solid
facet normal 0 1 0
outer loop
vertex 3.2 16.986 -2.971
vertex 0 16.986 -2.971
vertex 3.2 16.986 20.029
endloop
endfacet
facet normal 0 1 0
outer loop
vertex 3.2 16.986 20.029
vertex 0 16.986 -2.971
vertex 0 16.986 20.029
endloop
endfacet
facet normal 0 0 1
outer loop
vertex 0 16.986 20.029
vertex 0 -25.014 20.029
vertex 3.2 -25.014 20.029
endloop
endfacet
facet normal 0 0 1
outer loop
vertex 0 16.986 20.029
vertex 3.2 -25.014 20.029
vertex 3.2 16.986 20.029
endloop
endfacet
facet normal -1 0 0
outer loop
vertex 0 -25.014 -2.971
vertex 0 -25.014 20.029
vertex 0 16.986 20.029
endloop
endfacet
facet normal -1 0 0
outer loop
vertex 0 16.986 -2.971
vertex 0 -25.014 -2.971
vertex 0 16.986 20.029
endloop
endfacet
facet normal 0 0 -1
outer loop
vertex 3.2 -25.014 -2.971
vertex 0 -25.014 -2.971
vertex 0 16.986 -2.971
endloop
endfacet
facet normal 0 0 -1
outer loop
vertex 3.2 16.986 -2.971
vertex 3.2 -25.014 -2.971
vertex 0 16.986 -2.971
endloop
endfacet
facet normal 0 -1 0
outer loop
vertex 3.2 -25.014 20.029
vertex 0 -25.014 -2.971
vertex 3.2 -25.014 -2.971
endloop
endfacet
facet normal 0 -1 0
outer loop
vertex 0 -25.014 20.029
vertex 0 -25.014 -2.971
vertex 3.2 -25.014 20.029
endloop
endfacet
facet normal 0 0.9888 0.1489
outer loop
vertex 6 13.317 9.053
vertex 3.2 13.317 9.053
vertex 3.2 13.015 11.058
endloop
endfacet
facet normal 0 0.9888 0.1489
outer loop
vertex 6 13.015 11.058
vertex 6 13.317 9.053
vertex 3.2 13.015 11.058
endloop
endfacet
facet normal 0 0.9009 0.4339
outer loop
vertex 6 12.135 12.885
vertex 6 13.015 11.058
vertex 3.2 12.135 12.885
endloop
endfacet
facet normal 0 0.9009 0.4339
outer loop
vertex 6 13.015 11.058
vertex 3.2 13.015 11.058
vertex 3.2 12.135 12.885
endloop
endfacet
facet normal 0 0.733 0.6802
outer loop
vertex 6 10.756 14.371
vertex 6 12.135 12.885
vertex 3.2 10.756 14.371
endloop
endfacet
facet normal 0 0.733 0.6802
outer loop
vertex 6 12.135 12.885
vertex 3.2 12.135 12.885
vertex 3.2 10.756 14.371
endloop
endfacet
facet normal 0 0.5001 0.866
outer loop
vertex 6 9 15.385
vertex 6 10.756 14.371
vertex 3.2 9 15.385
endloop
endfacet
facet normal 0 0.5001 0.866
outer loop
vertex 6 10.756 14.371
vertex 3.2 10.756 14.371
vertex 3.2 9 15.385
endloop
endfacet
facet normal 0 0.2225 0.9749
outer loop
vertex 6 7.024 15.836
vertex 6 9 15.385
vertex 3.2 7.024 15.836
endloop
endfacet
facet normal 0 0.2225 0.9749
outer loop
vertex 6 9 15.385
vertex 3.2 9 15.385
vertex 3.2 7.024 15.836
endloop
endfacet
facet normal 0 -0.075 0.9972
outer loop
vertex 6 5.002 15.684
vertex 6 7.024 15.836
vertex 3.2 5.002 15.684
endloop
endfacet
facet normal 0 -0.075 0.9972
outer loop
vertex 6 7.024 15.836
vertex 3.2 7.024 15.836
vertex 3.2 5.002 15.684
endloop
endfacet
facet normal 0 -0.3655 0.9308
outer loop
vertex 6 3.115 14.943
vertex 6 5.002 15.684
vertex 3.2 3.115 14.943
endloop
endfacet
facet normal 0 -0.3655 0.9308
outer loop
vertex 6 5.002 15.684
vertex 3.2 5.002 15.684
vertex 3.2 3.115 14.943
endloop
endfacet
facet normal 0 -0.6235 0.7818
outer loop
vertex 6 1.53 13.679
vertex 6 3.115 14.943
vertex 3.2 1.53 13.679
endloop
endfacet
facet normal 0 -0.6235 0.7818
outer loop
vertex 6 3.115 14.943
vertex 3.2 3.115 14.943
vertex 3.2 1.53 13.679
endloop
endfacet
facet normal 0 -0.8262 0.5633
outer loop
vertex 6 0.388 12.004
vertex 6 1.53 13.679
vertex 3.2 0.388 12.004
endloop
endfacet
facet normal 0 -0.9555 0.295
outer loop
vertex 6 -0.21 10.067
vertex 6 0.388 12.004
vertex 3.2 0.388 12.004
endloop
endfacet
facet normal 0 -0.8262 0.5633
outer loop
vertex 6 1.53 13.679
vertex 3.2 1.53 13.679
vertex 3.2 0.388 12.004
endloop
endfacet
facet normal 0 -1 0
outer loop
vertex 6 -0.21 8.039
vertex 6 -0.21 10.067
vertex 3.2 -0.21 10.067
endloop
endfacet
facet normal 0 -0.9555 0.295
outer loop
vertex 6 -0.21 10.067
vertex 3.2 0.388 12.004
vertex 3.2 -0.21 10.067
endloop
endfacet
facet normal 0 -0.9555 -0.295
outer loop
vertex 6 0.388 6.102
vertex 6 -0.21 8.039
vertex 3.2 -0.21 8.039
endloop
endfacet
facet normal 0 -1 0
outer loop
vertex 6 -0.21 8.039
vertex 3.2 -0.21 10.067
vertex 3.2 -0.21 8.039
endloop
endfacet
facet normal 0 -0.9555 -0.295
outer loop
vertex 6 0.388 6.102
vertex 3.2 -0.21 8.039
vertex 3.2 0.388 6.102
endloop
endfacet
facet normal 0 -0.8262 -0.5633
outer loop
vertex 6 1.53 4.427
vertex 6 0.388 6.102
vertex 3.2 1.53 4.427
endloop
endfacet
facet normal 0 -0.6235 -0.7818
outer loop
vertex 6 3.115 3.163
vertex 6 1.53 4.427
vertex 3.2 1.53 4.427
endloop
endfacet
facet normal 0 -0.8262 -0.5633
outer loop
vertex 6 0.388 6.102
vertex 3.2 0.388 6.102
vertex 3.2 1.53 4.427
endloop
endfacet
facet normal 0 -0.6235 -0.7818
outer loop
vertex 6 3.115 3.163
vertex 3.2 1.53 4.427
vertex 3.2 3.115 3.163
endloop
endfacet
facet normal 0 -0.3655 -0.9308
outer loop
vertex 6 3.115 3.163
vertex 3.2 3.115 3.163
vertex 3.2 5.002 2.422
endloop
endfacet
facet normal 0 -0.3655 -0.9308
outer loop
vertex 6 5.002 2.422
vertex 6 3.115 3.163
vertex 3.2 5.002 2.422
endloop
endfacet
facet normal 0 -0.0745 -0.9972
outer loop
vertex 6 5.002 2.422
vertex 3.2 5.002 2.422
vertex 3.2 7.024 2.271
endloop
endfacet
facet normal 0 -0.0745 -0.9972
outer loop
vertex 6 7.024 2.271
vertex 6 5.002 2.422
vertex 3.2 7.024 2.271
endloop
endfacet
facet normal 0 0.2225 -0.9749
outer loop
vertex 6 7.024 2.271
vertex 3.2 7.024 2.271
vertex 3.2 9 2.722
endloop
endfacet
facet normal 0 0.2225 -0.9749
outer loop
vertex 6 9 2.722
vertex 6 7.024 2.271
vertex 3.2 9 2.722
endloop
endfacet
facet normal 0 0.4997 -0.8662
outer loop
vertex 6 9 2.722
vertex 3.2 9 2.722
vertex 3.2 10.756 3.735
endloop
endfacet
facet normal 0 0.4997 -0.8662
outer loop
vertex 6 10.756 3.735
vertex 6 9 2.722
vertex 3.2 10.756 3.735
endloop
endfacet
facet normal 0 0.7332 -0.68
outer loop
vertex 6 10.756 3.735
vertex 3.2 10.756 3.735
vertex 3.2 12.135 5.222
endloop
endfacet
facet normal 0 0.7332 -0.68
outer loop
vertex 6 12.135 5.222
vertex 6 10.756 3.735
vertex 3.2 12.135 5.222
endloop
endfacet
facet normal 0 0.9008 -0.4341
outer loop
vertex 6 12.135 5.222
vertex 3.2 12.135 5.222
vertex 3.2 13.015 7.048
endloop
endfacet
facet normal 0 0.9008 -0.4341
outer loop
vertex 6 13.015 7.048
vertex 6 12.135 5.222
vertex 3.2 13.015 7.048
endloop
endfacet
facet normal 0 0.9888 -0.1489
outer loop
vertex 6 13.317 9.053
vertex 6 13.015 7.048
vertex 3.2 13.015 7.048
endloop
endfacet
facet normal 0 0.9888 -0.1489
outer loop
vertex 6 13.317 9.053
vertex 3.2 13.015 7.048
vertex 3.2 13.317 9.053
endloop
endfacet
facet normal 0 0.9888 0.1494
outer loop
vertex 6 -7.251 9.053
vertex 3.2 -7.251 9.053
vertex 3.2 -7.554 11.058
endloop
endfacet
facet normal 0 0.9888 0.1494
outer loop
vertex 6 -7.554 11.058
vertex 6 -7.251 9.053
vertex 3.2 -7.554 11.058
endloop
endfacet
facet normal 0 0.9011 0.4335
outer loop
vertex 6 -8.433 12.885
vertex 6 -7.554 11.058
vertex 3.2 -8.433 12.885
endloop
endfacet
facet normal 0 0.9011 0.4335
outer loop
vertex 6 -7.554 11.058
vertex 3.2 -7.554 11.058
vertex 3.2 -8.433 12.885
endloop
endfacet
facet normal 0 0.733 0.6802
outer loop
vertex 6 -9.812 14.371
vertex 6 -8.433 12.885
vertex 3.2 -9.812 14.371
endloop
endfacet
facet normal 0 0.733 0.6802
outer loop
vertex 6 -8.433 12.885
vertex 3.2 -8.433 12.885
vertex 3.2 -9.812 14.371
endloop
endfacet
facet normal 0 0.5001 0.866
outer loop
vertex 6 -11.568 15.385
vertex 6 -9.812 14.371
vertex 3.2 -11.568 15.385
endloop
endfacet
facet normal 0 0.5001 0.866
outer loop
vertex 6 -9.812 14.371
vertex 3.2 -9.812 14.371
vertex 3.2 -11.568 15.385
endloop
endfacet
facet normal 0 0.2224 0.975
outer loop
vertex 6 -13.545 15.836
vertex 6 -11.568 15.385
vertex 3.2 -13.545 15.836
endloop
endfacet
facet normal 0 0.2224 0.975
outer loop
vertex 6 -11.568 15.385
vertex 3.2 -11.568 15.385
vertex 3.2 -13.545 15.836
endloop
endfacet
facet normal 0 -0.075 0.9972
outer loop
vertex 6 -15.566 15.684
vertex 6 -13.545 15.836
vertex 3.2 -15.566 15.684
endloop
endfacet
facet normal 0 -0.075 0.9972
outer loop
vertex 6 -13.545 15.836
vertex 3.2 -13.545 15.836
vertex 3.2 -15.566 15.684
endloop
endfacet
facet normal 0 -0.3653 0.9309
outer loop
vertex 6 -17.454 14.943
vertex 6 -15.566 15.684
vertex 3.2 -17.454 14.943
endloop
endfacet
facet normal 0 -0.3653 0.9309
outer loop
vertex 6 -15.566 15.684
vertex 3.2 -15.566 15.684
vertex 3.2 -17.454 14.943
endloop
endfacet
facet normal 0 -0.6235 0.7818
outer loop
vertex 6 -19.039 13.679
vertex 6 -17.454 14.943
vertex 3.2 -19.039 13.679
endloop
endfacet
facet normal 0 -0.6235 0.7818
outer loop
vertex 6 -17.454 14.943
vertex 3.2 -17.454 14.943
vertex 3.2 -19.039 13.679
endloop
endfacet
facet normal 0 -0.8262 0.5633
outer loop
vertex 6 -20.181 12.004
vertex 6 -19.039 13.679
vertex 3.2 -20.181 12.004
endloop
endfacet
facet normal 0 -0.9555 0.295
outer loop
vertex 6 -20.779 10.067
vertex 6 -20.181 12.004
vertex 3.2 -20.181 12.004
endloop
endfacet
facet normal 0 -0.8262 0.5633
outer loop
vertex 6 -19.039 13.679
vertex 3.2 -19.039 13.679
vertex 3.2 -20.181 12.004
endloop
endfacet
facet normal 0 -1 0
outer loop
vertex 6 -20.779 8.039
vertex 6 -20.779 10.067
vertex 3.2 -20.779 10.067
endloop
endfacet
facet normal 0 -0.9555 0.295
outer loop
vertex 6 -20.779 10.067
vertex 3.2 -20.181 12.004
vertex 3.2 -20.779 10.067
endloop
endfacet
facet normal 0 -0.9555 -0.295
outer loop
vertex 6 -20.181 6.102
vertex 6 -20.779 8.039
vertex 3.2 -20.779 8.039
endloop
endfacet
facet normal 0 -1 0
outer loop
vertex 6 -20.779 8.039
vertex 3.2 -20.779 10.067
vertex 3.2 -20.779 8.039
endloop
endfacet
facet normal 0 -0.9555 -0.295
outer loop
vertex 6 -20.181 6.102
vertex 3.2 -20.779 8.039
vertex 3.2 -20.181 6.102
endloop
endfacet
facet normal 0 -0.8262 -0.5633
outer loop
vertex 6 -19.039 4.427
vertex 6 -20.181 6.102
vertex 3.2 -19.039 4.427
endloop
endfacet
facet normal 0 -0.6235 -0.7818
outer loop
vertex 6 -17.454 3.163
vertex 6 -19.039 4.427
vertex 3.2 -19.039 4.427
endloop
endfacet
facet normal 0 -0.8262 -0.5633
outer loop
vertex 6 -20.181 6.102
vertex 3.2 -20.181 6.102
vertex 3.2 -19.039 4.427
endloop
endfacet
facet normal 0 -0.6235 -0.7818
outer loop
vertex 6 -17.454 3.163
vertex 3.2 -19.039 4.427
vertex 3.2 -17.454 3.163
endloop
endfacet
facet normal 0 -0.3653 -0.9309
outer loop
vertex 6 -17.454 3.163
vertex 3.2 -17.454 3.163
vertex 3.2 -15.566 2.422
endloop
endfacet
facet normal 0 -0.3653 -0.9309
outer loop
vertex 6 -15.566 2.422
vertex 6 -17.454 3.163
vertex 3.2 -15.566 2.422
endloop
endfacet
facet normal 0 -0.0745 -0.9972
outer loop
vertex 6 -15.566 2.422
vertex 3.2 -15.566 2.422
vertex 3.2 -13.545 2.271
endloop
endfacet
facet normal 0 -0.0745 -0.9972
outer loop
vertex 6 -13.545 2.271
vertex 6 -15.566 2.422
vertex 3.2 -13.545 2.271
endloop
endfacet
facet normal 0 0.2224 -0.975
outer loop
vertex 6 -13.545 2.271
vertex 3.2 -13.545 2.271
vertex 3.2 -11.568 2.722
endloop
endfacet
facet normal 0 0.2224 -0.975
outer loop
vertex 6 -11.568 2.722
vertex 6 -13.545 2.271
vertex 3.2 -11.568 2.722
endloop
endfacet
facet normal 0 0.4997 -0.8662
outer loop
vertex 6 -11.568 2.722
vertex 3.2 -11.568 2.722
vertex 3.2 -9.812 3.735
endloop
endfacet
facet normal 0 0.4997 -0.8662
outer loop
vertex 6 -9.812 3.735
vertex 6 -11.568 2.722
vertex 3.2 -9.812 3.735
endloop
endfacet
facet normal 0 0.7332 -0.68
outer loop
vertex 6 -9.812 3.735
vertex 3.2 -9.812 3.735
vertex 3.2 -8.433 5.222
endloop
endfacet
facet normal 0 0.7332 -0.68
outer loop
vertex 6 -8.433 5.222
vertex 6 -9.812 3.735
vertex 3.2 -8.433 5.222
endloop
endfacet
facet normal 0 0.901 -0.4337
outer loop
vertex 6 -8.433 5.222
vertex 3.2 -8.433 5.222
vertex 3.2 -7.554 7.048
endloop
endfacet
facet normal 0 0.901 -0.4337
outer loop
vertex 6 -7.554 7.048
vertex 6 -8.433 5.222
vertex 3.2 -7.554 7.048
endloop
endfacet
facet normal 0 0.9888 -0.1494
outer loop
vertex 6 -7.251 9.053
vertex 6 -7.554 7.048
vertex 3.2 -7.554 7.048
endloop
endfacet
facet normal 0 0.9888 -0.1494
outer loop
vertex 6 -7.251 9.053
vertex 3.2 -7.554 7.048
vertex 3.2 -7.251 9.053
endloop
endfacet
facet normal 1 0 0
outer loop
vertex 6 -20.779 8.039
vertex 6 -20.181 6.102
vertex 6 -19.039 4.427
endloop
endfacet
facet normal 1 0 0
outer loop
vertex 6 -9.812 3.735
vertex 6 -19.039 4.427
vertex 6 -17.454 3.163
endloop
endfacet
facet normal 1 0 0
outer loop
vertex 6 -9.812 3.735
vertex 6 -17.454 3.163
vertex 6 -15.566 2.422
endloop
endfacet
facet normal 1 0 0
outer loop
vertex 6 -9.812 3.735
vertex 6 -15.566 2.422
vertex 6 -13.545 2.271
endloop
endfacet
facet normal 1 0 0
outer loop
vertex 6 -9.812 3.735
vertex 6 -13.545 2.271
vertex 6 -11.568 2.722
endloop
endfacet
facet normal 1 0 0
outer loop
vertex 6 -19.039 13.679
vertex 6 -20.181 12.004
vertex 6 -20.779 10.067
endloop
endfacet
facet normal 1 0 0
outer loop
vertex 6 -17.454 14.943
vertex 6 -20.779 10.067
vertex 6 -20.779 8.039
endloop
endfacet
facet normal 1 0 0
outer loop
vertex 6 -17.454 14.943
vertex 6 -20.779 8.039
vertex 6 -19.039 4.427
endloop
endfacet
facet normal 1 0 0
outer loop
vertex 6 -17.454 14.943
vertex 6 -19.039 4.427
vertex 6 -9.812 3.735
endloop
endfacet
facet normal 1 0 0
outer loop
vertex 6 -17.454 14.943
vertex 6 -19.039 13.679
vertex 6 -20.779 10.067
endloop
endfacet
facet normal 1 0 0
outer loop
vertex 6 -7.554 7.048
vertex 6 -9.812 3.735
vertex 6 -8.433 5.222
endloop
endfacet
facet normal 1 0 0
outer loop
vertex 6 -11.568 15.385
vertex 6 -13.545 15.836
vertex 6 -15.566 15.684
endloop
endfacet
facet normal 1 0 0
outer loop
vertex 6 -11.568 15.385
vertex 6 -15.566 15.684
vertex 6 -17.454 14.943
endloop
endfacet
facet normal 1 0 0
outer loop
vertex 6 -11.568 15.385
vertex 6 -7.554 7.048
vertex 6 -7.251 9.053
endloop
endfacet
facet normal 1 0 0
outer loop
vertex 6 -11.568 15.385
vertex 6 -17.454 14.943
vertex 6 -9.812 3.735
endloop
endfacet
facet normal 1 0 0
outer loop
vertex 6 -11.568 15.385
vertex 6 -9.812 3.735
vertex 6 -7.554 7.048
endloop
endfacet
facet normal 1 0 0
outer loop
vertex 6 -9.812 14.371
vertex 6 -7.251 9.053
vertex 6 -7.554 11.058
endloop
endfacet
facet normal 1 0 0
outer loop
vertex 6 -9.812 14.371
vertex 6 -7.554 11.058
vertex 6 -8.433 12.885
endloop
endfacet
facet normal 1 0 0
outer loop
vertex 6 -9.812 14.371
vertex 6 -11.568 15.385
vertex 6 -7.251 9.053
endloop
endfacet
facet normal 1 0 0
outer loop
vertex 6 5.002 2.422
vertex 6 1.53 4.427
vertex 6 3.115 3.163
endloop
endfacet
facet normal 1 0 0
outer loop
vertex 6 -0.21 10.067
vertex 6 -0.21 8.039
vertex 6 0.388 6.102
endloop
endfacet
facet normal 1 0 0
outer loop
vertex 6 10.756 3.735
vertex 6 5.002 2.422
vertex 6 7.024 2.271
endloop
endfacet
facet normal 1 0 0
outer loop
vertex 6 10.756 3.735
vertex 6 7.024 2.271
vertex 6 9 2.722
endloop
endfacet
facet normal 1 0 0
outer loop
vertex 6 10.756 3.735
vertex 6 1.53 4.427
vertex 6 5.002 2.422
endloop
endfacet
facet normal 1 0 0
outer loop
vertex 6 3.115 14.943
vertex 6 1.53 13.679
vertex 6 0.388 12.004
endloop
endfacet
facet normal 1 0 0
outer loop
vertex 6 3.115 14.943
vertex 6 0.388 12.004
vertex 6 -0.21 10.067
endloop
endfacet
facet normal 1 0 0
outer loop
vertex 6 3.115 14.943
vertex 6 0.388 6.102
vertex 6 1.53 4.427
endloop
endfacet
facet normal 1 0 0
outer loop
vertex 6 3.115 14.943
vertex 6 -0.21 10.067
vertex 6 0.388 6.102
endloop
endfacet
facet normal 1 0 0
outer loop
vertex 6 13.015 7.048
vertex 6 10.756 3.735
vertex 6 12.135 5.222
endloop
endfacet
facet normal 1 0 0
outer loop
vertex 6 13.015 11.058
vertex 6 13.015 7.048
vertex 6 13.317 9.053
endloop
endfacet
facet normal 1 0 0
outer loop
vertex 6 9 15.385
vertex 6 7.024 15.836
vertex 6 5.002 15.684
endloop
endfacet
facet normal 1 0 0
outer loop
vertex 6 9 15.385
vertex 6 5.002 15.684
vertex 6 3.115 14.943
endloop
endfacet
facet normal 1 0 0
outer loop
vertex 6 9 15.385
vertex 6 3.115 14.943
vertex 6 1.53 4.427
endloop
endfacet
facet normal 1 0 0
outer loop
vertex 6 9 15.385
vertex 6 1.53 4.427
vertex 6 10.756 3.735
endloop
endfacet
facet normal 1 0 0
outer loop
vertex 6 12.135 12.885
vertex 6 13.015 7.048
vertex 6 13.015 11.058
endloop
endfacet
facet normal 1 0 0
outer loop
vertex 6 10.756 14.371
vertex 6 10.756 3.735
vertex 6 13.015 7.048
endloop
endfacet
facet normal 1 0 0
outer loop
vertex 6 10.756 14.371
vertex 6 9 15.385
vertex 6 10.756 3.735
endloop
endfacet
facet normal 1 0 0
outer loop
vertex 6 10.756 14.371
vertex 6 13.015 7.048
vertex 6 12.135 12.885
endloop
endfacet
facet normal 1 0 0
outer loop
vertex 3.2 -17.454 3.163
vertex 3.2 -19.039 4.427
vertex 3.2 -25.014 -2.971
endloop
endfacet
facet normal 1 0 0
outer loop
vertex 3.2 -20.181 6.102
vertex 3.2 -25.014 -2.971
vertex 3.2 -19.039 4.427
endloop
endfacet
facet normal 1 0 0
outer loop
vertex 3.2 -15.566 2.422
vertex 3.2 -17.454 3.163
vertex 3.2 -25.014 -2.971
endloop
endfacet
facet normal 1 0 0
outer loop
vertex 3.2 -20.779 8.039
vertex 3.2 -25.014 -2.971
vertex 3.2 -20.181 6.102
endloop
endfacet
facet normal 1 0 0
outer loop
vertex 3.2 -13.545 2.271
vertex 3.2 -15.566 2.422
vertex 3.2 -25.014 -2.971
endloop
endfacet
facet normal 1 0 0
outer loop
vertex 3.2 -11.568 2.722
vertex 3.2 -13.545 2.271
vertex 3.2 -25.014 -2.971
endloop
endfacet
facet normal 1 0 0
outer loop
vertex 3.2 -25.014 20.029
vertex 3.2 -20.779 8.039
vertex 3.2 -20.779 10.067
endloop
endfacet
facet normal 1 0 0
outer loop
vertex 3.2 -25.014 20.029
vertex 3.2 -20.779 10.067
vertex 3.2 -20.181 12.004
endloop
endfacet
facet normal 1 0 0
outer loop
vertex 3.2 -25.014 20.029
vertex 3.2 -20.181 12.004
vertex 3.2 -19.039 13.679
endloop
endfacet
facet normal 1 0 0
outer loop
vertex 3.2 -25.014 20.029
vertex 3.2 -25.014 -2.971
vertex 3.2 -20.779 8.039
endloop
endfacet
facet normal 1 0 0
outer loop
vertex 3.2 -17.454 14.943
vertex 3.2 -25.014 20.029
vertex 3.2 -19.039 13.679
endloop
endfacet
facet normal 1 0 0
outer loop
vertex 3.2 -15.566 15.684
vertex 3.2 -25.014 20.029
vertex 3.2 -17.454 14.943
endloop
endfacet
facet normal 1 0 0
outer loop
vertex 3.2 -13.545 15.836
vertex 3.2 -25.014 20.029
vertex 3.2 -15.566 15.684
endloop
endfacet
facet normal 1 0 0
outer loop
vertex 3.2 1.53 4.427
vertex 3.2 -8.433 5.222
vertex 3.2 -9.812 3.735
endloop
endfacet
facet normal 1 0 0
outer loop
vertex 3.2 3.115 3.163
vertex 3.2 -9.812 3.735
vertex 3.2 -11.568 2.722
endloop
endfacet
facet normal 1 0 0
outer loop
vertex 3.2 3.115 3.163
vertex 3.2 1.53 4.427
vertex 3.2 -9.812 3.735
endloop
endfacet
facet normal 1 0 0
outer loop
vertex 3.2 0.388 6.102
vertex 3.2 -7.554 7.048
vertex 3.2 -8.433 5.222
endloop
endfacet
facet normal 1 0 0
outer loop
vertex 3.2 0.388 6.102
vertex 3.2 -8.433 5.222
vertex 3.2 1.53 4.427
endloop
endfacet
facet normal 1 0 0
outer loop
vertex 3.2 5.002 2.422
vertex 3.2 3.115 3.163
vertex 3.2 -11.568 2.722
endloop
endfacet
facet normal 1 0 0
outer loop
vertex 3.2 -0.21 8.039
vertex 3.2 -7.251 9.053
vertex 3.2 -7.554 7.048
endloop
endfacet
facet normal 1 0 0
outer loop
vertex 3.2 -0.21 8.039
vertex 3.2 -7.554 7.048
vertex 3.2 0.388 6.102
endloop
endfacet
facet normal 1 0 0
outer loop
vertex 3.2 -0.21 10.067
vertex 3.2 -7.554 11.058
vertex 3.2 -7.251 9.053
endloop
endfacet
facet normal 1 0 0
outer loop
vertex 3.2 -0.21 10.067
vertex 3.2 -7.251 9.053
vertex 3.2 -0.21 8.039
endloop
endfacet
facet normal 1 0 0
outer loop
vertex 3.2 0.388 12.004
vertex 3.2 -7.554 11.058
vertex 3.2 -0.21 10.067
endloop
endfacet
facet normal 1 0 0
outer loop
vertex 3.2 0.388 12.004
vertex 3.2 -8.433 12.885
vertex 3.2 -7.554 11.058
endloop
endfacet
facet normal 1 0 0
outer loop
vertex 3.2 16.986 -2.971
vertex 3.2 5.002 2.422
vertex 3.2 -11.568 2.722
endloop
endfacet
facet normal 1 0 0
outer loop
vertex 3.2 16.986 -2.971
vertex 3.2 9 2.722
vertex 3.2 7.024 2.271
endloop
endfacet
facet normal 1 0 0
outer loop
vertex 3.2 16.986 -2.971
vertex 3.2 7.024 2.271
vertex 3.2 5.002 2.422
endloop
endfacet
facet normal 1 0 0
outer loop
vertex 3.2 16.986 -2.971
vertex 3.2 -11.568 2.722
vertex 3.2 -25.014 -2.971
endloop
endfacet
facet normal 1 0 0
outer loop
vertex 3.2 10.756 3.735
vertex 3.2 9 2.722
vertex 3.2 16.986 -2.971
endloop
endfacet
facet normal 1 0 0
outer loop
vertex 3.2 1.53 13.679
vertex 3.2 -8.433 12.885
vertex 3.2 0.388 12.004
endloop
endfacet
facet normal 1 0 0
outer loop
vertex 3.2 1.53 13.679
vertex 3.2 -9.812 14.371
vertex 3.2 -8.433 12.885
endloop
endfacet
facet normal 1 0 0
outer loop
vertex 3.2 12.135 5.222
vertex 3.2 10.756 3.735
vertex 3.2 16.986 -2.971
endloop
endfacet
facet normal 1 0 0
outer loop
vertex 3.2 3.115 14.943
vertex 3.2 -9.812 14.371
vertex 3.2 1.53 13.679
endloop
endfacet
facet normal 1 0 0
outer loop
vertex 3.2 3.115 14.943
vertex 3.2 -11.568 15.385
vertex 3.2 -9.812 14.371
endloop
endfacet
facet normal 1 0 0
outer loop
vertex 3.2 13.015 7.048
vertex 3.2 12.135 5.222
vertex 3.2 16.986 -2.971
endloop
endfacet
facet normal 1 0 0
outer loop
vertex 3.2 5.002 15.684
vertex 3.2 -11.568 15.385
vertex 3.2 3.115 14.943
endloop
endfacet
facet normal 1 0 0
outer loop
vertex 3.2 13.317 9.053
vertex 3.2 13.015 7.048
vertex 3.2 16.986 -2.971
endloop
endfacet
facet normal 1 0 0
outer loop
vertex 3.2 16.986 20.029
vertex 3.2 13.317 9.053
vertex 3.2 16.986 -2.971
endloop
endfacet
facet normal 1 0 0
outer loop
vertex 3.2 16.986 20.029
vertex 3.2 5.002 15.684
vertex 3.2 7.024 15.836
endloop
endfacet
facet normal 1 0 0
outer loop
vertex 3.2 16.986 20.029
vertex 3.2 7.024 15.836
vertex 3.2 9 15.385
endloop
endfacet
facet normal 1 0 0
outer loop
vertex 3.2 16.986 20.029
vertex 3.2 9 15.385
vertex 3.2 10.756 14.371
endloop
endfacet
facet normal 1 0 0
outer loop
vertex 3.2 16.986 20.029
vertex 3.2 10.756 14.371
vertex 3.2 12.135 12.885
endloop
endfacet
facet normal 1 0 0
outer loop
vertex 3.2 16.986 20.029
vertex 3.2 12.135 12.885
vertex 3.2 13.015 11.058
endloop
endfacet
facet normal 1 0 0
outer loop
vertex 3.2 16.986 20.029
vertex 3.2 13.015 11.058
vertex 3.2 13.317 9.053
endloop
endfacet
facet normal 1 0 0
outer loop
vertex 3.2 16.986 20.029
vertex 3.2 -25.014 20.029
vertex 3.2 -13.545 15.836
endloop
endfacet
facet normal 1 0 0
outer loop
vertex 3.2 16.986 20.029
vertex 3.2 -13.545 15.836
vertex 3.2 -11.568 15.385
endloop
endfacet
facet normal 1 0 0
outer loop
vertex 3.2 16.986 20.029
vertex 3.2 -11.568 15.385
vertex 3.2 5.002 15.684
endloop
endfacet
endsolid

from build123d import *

# Parameters (mm, degrees)
F0_W     = 42
F0_H     = 23
F1_DEPTH = 3.2
F2_R     = 6.801578
F3_DEPTH = 6


with BuildPart() as f1:
    # F0 (on Right) → F1 (new body)
    with BuildSketch(Plane.YZ):
        with Locations((-4.014331, 8.529418)):
            Rectangle(F0_W, F0_H)
    extrude(amount=F1_DEPTH)

    # F2 (on Right) → F3 (join)
    with BuildSketch(Plane.YZ):
        with Locations((-14.052913, 9.053115)):
            Circle(F2_R)
        with Locations((6.515576, 9.053115)):
            Circle(F2_R)
    extrude(amount=F3_DEPTH)


solid = f1.part
